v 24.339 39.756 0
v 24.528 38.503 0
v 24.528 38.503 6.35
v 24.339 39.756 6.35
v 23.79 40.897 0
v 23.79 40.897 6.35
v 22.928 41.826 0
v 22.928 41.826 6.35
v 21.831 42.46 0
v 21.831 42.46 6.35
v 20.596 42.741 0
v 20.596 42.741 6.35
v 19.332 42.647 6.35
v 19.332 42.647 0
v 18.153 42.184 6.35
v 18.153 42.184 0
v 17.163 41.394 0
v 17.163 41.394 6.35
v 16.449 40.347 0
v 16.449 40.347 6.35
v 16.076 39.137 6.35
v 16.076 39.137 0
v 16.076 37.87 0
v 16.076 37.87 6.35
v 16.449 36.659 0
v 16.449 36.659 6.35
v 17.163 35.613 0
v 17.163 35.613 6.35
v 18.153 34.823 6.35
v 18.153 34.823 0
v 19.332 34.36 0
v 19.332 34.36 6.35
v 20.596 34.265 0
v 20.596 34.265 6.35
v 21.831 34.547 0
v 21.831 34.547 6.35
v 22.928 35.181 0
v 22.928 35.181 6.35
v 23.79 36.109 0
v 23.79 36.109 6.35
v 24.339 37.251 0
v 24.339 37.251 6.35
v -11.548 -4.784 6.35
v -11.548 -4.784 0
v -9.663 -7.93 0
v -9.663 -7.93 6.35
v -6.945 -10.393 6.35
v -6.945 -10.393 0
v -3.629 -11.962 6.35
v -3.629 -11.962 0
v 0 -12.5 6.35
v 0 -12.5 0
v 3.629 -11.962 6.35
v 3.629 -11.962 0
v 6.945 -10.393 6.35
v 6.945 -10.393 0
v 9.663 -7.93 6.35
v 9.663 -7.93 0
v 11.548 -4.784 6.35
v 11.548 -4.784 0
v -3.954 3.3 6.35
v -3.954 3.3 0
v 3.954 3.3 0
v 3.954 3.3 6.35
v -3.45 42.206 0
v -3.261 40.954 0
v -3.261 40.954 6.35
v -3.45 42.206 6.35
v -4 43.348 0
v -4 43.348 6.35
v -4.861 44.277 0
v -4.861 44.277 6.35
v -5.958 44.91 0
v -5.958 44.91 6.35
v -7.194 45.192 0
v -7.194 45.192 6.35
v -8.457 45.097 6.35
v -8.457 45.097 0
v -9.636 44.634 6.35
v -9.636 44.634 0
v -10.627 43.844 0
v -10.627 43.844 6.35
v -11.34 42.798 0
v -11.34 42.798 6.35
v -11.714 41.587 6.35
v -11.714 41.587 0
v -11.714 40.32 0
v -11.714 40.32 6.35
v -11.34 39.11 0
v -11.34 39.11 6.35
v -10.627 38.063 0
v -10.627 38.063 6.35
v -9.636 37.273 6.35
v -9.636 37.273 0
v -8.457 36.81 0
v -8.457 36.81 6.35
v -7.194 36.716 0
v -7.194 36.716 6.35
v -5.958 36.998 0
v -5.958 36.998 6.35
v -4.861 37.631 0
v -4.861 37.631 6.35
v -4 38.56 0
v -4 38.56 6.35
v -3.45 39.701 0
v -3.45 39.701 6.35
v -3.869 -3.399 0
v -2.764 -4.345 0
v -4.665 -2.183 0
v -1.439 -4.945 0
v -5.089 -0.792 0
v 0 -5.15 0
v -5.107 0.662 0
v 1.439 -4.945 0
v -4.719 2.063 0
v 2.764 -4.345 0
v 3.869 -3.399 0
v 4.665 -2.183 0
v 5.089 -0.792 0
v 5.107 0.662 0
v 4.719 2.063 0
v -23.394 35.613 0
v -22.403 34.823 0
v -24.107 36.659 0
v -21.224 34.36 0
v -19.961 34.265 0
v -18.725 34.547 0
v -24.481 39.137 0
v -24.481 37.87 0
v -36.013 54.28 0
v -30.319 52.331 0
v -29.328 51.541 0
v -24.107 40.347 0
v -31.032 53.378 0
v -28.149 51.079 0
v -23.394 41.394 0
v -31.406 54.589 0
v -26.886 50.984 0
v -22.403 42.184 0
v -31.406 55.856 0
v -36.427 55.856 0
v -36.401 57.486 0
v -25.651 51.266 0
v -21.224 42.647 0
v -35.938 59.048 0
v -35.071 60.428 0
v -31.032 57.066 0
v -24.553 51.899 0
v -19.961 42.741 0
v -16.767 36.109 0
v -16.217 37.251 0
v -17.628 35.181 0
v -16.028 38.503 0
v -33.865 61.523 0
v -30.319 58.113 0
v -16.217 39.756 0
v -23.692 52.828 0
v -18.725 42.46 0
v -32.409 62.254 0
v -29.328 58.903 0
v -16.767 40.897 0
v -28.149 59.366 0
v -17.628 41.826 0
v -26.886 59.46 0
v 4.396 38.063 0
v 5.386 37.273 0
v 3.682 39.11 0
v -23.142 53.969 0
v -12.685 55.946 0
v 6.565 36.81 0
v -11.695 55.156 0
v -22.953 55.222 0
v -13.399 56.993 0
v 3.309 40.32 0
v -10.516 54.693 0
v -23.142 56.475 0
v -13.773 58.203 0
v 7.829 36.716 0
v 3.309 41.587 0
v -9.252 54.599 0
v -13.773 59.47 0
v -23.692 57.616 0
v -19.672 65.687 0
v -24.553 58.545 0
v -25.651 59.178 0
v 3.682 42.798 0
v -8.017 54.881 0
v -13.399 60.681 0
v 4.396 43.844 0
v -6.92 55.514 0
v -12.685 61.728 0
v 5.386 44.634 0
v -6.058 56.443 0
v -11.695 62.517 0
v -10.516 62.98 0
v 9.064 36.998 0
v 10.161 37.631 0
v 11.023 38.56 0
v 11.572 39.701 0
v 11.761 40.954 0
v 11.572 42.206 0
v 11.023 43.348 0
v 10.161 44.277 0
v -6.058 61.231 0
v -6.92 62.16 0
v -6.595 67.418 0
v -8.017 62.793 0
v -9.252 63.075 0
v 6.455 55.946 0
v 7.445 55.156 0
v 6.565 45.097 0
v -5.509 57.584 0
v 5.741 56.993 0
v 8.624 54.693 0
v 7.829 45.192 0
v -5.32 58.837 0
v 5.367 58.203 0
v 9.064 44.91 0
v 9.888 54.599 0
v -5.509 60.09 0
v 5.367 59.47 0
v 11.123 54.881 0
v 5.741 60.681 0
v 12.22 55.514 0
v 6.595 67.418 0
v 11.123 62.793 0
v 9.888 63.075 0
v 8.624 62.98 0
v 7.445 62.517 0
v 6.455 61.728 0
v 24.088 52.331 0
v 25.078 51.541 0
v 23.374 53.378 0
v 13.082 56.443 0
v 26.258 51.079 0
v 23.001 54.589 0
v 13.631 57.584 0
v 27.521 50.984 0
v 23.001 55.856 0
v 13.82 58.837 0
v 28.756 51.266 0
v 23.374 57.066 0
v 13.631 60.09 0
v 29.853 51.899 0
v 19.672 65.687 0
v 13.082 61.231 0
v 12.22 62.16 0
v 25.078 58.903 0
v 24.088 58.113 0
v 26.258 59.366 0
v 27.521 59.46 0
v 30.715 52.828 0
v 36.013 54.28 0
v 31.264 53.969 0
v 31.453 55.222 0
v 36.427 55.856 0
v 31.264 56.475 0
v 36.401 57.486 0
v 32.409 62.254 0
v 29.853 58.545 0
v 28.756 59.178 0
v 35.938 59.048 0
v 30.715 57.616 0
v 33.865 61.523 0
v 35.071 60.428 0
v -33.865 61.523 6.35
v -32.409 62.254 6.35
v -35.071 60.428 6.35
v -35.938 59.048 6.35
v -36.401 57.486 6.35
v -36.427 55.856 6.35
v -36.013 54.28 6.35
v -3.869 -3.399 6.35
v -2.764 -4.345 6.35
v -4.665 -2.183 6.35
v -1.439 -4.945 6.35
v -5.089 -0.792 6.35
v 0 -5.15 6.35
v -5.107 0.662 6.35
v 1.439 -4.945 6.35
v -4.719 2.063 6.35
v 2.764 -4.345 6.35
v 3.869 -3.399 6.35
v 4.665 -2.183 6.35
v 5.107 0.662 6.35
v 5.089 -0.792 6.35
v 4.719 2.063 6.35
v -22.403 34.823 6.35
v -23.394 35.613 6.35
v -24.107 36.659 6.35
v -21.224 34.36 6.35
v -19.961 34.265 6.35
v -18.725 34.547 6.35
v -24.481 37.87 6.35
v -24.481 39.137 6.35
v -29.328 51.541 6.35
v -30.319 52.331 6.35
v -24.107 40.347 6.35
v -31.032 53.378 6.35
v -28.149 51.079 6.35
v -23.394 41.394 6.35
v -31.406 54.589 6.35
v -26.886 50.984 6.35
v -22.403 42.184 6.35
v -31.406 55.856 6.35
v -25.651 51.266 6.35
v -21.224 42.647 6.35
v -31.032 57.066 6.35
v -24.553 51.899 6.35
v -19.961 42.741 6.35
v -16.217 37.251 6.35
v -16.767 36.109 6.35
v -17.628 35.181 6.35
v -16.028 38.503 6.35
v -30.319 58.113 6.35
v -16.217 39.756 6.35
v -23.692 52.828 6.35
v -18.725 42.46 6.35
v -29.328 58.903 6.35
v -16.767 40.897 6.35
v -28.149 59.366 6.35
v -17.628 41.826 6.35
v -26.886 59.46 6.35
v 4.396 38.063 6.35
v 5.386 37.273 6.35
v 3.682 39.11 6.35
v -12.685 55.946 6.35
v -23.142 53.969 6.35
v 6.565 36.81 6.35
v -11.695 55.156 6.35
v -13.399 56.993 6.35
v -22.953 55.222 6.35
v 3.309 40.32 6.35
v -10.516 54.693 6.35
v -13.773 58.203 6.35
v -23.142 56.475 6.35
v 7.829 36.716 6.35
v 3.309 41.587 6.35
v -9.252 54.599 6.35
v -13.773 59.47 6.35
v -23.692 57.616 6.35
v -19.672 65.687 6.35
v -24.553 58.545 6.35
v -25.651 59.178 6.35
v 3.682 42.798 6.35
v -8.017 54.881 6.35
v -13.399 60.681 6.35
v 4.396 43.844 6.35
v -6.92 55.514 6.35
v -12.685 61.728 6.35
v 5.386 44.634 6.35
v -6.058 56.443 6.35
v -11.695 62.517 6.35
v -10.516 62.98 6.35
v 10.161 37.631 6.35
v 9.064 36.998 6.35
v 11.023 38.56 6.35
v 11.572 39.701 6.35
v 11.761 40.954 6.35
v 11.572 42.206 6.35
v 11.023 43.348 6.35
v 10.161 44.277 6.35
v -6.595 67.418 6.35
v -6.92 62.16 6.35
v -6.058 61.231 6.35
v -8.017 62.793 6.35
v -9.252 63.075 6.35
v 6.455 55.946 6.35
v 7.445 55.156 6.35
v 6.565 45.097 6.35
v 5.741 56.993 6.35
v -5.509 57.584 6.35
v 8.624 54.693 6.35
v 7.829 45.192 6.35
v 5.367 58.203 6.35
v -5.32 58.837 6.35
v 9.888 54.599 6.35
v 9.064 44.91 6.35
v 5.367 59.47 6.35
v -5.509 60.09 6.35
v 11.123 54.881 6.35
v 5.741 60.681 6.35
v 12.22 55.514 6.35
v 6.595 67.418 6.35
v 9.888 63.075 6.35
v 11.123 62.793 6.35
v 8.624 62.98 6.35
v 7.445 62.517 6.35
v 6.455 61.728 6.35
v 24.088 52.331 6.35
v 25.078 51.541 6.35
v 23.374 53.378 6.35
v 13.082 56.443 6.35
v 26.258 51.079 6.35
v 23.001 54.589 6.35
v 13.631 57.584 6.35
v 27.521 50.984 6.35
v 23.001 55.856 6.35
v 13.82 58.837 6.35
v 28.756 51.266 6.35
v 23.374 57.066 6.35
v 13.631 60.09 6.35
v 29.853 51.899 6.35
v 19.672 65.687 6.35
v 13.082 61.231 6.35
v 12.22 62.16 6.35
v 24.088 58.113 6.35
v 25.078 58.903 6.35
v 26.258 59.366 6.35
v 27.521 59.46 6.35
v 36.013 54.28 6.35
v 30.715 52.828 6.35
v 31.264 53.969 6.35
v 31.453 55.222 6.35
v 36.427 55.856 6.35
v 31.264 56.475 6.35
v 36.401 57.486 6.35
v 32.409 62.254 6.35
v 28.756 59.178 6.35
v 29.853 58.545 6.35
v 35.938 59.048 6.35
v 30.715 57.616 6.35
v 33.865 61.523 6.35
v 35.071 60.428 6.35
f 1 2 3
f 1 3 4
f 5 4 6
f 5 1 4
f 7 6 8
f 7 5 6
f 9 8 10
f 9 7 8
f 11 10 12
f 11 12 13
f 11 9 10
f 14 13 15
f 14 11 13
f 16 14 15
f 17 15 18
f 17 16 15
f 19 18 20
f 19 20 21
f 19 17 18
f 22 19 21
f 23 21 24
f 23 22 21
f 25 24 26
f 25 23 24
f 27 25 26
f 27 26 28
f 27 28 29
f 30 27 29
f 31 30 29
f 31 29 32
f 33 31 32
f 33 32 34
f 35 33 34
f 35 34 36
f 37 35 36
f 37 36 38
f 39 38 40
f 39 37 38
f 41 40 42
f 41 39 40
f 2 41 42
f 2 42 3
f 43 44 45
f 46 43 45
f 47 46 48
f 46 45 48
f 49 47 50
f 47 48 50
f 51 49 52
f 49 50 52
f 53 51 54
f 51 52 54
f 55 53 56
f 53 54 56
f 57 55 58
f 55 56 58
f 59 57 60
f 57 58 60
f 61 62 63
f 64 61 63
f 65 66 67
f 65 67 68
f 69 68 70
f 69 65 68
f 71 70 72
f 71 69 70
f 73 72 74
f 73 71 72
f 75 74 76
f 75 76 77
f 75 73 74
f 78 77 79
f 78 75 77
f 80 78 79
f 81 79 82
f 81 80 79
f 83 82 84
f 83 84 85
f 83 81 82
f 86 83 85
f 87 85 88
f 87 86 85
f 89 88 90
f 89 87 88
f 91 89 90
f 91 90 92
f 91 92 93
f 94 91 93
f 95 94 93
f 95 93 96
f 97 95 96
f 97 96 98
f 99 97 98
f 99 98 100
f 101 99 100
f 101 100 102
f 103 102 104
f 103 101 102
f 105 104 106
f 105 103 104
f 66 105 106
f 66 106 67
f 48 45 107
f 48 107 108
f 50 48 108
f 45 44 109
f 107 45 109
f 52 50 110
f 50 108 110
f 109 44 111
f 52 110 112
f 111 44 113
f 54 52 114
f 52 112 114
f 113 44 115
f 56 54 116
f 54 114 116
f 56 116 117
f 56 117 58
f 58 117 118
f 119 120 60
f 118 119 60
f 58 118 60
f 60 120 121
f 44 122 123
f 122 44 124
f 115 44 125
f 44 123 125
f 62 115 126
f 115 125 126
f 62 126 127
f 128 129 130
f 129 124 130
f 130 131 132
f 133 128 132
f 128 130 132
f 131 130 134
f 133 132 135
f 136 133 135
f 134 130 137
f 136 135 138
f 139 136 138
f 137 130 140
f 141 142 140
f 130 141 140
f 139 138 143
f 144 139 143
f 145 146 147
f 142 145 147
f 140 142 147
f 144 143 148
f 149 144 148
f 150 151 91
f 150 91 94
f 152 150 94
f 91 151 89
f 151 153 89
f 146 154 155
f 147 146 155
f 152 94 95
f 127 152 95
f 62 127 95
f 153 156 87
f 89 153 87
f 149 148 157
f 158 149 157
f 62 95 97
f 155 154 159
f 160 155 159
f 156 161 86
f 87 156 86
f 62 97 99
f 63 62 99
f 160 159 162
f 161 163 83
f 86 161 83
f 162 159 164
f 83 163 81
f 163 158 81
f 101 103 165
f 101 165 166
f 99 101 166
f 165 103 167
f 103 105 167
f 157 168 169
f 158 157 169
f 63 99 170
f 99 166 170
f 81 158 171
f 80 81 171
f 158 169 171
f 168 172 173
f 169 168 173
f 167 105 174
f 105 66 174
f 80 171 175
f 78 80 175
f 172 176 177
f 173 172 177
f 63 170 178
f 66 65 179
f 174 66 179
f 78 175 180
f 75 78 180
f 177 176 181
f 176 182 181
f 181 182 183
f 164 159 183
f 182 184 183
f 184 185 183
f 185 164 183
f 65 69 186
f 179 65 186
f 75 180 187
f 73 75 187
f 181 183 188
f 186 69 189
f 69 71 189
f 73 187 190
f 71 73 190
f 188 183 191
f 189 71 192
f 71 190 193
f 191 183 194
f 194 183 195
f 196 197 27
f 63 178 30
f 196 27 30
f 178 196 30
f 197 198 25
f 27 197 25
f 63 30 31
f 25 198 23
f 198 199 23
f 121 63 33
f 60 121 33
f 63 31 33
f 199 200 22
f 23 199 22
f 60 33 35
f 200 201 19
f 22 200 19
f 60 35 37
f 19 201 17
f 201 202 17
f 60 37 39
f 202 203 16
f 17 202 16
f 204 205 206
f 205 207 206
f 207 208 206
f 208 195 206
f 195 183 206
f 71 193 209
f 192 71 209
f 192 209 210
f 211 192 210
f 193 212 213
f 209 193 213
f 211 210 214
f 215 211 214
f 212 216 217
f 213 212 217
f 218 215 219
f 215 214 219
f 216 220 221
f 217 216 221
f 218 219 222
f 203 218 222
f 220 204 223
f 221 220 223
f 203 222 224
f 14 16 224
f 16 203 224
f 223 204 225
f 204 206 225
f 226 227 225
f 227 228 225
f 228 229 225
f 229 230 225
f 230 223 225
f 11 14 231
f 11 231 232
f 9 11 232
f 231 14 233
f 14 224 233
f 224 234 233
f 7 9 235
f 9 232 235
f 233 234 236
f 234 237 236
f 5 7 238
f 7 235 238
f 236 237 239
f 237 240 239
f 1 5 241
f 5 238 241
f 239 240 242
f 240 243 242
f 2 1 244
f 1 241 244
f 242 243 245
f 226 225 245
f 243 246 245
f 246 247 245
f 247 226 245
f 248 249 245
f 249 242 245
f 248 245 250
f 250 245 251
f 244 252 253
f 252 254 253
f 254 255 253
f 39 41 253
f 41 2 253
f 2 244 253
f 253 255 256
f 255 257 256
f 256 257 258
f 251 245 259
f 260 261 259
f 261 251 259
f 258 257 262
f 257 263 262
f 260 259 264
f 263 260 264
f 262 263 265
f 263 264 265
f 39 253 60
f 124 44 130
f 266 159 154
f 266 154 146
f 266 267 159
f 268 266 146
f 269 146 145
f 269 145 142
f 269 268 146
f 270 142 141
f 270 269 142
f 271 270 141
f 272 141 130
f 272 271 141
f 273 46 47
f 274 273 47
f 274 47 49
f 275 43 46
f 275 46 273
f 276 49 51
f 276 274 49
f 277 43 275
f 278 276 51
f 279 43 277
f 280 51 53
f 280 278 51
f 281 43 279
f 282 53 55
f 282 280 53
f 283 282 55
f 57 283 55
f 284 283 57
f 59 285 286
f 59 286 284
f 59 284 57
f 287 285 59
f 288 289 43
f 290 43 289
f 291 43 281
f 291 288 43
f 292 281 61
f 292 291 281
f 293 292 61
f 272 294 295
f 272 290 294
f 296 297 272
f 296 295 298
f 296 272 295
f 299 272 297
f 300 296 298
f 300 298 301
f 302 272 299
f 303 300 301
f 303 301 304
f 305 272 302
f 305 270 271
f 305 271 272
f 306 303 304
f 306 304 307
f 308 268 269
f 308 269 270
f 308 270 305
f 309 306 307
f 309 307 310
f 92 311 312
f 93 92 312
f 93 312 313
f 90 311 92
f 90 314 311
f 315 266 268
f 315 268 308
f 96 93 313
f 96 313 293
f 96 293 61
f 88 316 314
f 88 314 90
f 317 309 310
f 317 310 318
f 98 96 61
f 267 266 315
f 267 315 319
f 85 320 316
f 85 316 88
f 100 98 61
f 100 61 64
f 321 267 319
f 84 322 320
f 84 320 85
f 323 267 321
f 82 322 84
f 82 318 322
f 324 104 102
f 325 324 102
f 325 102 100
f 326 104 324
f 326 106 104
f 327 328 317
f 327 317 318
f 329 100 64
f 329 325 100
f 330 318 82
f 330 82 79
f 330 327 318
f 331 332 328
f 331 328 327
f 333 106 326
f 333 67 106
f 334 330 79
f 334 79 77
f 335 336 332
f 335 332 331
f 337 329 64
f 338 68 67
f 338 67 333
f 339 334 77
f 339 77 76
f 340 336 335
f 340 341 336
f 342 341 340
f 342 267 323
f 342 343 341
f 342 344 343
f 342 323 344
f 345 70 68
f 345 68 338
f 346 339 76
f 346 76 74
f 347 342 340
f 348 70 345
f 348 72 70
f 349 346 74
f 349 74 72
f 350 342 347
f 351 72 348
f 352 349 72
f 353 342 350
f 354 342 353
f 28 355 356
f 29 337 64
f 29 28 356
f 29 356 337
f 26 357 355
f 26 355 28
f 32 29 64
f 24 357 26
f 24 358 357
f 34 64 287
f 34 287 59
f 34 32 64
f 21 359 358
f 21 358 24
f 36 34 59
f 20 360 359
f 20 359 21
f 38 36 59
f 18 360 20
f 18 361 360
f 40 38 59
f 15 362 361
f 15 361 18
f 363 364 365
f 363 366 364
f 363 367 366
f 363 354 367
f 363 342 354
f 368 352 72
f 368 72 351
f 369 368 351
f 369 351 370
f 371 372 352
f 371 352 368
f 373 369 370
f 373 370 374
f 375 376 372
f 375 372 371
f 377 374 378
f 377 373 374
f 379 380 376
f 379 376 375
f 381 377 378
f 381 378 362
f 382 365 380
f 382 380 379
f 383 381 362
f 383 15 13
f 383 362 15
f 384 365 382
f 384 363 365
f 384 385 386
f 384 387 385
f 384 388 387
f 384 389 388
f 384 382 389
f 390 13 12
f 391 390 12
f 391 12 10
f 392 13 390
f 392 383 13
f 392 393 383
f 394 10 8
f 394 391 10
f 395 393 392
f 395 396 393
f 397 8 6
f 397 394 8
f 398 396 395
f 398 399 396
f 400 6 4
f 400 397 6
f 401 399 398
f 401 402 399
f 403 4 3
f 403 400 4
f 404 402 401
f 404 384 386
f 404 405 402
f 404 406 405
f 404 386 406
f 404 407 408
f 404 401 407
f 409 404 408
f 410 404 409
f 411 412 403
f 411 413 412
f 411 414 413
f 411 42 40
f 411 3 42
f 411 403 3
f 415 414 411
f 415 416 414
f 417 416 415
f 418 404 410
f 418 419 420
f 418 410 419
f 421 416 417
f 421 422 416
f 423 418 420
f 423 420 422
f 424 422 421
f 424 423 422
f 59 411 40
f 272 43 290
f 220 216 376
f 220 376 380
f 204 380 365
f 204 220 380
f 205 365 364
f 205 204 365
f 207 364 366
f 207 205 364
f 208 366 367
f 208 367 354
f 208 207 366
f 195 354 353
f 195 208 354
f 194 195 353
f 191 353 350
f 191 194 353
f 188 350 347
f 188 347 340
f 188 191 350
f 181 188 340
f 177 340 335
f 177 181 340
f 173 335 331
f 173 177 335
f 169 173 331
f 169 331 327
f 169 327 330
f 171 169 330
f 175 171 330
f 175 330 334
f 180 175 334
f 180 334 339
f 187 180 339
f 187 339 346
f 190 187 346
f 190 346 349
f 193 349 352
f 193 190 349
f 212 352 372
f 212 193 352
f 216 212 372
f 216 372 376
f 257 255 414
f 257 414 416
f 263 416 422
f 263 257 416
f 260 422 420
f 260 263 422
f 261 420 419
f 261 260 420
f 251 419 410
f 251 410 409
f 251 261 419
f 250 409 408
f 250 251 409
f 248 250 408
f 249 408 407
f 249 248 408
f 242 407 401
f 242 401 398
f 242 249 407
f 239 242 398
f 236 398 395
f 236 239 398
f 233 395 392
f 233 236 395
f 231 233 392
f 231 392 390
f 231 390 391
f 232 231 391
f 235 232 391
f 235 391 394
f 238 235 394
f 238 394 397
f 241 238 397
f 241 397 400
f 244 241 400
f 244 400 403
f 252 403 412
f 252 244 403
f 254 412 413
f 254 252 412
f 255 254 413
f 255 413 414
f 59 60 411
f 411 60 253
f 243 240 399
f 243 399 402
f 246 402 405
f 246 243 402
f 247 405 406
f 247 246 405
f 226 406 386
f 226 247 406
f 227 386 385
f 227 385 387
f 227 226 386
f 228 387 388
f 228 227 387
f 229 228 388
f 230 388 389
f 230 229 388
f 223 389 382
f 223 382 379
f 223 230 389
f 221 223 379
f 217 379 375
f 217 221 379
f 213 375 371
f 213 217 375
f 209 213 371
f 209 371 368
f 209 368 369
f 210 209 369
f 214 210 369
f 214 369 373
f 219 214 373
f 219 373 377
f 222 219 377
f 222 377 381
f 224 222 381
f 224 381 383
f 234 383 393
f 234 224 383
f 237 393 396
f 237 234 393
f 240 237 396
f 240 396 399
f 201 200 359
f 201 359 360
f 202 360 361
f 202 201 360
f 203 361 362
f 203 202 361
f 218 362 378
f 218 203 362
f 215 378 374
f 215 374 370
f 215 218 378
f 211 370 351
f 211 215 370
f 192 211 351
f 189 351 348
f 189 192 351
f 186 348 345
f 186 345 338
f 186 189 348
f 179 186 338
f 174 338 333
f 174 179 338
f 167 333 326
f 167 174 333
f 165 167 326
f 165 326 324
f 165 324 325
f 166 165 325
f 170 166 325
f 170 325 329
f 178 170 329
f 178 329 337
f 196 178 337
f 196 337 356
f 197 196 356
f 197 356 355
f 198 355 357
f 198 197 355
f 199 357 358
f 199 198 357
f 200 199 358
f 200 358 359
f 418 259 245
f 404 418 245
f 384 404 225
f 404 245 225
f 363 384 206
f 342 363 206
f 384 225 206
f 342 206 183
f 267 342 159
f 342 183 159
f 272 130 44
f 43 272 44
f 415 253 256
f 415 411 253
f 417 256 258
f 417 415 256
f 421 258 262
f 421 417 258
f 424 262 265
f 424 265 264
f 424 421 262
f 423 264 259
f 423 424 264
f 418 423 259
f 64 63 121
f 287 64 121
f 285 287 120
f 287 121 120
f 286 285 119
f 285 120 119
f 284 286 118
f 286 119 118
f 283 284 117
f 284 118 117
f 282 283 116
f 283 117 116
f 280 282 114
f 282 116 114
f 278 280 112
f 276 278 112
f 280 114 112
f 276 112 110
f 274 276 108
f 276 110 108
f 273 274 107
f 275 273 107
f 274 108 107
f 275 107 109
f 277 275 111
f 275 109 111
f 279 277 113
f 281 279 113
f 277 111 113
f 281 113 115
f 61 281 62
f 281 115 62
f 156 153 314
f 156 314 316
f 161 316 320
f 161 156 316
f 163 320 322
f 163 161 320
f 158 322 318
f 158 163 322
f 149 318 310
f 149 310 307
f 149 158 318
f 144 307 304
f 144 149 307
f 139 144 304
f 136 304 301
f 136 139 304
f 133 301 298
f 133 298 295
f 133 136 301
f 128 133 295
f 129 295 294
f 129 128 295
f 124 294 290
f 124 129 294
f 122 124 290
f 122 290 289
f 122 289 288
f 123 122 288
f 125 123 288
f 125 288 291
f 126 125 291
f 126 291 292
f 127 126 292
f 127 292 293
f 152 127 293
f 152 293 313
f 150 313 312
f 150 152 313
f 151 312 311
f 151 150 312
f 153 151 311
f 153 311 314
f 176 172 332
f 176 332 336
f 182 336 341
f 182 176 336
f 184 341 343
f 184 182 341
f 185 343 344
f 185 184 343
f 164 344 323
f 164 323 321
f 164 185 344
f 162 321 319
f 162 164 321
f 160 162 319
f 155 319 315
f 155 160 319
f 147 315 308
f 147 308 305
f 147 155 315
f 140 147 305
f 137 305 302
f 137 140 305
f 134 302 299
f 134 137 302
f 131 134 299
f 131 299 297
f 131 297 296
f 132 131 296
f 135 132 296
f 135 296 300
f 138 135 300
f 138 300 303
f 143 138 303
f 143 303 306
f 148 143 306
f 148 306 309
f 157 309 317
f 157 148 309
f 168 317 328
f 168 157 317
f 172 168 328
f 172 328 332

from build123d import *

# Parameters (mm, degrees)
SKETCH2_R           = 4.25
BOSS_EXTRUDE1_DEPTH = 6.35
FILLET1_R           = 6


with BuildPart() as part:
    # Sketch2 → Boss-Extrude1 (new body)
    with BuildSketch(Plane.XY):
        with BuildLine():
            Line((11.548494156, -4.783542905), (38.382716246, 60))
            ThreePointArc((38.382716246, 60), (0, 67.634796955), (-38.382716246, 60))
            Line((-38.382716246, 60), (-11.548494156, -4.783542905))
            ThreePointArc((-11.548494156, -4.783542905), (0, -12.5), (11.548494156, -4.783542905))
        make_face()
        with Locations((-27.203312061, 55.222101201)):
            Circle(SKETCH2_R, mode=Mode.SUBTRACT)
        with Locations((-9.56999846, 58.836828221)):
            Circle(SKETCH2_R, mode=Mode.SUBTRACT)
        with Locations((9.56999846, 58.836828221)):
            Circle(SKETCH2_R, mode=Mode.SUBTRACT)
        with Locations((27.203312061, 55.222101201)):
            Circle(SKETCH2_R, mode=Mode.SUBTRACT)
        with Locations((-20.278160914, 38.503307381)):
            Circle(SKETCH2_R, mode=Mode.SUBTRACT)
        with Locations((-7.511195711, 40.953735809)):
            Circle(SKETCH2_R, mode=Mode.SUBTRACT)
        with Locations((7.511195711, 40.953735809)):
            Circle(SKETCH2_R, mode=Mode.SUBTRACT)
        with Locations((20.278160914, 38.503307381)):
            Circle(SKETCH2_R, mode=Mode.SUBTRACT)
        with BuildLine():
            Line((-3.953795645, 3.3), (3.953795645, 3.3))
            ThreePointArc((3.953795645, 3.3), (0, -5.15), (-3.953795645, 3.3))
        make_face(mode=Mode.SUBTRACT)
    extrude(amount=BOSS_EXTRUDE1_DEPTH)

    # Fillet1
    fillet1_edges = [part.edges().sort_by_distance(p)[0] for p in [
        (-38.382716246, 60, 3.175),
        (38.382716246, 60, 3.175),
    ]]
    fillet(fillet1_edges, radius=FILLET1_R)


solid = part.part
